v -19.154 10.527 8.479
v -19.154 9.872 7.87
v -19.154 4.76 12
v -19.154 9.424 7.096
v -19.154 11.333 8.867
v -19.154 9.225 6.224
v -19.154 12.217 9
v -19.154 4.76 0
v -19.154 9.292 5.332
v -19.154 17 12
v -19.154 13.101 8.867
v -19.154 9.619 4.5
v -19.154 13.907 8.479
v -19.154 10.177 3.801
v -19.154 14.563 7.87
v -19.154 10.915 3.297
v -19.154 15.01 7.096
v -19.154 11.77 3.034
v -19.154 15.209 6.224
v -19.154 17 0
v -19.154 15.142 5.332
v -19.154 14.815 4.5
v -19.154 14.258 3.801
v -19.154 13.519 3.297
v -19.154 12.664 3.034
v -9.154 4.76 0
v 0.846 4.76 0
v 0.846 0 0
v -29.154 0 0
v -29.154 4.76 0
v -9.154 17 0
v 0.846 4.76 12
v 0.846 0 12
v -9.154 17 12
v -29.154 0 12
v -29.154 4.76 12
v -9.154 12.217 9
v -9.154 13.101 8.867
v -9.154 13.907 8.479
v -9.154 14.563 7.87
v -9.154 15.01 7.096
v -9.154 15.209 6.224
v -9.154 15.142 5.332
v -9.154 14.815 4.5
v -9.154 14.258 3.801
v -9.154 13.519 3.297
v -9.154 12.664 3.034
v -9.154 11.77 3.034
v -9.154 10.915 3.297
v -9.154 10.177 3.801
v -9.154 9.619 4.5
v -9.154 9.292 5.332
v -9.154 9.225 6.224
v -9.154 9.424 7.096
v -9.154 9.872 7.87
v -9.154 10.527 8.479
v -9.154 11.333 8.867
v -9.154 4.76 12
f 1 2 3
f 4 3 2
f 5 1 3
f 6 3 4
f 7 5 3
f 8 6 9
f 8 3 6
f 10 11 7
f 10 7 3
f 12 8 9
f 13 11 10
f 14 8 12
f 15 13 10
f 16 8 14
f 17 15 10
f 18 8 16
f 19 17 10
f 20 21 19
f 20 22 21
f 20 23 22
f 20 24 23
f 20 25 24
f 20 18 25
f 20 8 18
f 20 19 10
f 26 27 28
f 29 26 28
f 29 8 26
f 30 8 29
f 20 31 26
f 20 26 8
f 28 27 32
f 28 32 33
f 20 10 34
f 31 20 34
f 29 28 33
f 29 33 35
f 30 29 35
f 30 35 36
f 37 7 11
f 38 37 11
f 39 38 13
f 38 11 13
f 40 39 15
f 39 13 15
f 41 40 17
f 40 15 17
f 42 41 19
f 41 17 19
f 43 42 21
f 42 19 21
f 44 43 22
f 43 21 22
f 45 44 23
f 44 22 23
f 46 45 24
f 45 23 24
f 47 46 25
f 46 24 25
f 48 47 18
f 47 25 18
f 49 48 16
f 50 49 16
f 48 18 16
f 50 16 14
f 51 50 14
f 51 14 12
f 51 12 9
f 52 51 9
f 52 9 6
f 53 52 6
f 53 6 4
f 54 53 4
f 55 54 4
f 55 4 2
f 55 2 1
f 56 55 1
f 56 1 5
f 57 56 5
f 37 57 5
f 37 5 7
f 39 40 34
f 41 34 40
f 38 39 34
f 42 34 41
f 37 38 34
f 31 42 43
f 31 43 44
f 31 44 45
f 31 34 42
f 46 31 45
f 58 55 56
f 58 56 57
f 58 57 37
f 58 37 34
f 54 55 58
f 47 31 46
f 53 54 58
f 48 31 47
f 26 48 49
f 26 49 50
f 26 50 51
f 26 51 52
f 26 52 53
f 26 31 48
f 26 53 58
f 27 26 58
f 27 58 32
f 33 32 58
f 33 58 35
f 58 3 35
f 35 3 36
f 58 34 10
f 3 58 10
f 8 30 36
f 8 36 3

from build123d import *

# Parameters (mm, degrees)
EXTRUDE_2_DEPTH     = 12
SKETCH_4_R          = 3
CUT_EXTRUDE_4_DEPTH = 29.861739379


with BuildPart() as part:
    # Эскиз2 → Вытянуть2 (new body)
    with BuildSketch(Plane.XY):
        Polygon((0.846446281, 0), (-29.153553719, 0), (-29.153553719, 4.760108812), (-19.153553719, 4.760108812), (-19.153553719, 17), (-9.153553719, 17), (-9.153553719, 4.760108812), (0.846446281, 4.760108812), align=None)
    extrude(amount=EXTRUDE_2_DEPTH)

    # Эскиз4 → Вытянуть4 (cut, through all)
    with BuildSketch(Plane.ZY.offset(19.153553719)):
        with Locations((6, 12.217021039)):
            Circle(SKETCH_4_R)
    extrude(amount=-CUT_EXTRUDE_4_DEPTH, mode=Mode.SUBTRACT)


solid = part.part
